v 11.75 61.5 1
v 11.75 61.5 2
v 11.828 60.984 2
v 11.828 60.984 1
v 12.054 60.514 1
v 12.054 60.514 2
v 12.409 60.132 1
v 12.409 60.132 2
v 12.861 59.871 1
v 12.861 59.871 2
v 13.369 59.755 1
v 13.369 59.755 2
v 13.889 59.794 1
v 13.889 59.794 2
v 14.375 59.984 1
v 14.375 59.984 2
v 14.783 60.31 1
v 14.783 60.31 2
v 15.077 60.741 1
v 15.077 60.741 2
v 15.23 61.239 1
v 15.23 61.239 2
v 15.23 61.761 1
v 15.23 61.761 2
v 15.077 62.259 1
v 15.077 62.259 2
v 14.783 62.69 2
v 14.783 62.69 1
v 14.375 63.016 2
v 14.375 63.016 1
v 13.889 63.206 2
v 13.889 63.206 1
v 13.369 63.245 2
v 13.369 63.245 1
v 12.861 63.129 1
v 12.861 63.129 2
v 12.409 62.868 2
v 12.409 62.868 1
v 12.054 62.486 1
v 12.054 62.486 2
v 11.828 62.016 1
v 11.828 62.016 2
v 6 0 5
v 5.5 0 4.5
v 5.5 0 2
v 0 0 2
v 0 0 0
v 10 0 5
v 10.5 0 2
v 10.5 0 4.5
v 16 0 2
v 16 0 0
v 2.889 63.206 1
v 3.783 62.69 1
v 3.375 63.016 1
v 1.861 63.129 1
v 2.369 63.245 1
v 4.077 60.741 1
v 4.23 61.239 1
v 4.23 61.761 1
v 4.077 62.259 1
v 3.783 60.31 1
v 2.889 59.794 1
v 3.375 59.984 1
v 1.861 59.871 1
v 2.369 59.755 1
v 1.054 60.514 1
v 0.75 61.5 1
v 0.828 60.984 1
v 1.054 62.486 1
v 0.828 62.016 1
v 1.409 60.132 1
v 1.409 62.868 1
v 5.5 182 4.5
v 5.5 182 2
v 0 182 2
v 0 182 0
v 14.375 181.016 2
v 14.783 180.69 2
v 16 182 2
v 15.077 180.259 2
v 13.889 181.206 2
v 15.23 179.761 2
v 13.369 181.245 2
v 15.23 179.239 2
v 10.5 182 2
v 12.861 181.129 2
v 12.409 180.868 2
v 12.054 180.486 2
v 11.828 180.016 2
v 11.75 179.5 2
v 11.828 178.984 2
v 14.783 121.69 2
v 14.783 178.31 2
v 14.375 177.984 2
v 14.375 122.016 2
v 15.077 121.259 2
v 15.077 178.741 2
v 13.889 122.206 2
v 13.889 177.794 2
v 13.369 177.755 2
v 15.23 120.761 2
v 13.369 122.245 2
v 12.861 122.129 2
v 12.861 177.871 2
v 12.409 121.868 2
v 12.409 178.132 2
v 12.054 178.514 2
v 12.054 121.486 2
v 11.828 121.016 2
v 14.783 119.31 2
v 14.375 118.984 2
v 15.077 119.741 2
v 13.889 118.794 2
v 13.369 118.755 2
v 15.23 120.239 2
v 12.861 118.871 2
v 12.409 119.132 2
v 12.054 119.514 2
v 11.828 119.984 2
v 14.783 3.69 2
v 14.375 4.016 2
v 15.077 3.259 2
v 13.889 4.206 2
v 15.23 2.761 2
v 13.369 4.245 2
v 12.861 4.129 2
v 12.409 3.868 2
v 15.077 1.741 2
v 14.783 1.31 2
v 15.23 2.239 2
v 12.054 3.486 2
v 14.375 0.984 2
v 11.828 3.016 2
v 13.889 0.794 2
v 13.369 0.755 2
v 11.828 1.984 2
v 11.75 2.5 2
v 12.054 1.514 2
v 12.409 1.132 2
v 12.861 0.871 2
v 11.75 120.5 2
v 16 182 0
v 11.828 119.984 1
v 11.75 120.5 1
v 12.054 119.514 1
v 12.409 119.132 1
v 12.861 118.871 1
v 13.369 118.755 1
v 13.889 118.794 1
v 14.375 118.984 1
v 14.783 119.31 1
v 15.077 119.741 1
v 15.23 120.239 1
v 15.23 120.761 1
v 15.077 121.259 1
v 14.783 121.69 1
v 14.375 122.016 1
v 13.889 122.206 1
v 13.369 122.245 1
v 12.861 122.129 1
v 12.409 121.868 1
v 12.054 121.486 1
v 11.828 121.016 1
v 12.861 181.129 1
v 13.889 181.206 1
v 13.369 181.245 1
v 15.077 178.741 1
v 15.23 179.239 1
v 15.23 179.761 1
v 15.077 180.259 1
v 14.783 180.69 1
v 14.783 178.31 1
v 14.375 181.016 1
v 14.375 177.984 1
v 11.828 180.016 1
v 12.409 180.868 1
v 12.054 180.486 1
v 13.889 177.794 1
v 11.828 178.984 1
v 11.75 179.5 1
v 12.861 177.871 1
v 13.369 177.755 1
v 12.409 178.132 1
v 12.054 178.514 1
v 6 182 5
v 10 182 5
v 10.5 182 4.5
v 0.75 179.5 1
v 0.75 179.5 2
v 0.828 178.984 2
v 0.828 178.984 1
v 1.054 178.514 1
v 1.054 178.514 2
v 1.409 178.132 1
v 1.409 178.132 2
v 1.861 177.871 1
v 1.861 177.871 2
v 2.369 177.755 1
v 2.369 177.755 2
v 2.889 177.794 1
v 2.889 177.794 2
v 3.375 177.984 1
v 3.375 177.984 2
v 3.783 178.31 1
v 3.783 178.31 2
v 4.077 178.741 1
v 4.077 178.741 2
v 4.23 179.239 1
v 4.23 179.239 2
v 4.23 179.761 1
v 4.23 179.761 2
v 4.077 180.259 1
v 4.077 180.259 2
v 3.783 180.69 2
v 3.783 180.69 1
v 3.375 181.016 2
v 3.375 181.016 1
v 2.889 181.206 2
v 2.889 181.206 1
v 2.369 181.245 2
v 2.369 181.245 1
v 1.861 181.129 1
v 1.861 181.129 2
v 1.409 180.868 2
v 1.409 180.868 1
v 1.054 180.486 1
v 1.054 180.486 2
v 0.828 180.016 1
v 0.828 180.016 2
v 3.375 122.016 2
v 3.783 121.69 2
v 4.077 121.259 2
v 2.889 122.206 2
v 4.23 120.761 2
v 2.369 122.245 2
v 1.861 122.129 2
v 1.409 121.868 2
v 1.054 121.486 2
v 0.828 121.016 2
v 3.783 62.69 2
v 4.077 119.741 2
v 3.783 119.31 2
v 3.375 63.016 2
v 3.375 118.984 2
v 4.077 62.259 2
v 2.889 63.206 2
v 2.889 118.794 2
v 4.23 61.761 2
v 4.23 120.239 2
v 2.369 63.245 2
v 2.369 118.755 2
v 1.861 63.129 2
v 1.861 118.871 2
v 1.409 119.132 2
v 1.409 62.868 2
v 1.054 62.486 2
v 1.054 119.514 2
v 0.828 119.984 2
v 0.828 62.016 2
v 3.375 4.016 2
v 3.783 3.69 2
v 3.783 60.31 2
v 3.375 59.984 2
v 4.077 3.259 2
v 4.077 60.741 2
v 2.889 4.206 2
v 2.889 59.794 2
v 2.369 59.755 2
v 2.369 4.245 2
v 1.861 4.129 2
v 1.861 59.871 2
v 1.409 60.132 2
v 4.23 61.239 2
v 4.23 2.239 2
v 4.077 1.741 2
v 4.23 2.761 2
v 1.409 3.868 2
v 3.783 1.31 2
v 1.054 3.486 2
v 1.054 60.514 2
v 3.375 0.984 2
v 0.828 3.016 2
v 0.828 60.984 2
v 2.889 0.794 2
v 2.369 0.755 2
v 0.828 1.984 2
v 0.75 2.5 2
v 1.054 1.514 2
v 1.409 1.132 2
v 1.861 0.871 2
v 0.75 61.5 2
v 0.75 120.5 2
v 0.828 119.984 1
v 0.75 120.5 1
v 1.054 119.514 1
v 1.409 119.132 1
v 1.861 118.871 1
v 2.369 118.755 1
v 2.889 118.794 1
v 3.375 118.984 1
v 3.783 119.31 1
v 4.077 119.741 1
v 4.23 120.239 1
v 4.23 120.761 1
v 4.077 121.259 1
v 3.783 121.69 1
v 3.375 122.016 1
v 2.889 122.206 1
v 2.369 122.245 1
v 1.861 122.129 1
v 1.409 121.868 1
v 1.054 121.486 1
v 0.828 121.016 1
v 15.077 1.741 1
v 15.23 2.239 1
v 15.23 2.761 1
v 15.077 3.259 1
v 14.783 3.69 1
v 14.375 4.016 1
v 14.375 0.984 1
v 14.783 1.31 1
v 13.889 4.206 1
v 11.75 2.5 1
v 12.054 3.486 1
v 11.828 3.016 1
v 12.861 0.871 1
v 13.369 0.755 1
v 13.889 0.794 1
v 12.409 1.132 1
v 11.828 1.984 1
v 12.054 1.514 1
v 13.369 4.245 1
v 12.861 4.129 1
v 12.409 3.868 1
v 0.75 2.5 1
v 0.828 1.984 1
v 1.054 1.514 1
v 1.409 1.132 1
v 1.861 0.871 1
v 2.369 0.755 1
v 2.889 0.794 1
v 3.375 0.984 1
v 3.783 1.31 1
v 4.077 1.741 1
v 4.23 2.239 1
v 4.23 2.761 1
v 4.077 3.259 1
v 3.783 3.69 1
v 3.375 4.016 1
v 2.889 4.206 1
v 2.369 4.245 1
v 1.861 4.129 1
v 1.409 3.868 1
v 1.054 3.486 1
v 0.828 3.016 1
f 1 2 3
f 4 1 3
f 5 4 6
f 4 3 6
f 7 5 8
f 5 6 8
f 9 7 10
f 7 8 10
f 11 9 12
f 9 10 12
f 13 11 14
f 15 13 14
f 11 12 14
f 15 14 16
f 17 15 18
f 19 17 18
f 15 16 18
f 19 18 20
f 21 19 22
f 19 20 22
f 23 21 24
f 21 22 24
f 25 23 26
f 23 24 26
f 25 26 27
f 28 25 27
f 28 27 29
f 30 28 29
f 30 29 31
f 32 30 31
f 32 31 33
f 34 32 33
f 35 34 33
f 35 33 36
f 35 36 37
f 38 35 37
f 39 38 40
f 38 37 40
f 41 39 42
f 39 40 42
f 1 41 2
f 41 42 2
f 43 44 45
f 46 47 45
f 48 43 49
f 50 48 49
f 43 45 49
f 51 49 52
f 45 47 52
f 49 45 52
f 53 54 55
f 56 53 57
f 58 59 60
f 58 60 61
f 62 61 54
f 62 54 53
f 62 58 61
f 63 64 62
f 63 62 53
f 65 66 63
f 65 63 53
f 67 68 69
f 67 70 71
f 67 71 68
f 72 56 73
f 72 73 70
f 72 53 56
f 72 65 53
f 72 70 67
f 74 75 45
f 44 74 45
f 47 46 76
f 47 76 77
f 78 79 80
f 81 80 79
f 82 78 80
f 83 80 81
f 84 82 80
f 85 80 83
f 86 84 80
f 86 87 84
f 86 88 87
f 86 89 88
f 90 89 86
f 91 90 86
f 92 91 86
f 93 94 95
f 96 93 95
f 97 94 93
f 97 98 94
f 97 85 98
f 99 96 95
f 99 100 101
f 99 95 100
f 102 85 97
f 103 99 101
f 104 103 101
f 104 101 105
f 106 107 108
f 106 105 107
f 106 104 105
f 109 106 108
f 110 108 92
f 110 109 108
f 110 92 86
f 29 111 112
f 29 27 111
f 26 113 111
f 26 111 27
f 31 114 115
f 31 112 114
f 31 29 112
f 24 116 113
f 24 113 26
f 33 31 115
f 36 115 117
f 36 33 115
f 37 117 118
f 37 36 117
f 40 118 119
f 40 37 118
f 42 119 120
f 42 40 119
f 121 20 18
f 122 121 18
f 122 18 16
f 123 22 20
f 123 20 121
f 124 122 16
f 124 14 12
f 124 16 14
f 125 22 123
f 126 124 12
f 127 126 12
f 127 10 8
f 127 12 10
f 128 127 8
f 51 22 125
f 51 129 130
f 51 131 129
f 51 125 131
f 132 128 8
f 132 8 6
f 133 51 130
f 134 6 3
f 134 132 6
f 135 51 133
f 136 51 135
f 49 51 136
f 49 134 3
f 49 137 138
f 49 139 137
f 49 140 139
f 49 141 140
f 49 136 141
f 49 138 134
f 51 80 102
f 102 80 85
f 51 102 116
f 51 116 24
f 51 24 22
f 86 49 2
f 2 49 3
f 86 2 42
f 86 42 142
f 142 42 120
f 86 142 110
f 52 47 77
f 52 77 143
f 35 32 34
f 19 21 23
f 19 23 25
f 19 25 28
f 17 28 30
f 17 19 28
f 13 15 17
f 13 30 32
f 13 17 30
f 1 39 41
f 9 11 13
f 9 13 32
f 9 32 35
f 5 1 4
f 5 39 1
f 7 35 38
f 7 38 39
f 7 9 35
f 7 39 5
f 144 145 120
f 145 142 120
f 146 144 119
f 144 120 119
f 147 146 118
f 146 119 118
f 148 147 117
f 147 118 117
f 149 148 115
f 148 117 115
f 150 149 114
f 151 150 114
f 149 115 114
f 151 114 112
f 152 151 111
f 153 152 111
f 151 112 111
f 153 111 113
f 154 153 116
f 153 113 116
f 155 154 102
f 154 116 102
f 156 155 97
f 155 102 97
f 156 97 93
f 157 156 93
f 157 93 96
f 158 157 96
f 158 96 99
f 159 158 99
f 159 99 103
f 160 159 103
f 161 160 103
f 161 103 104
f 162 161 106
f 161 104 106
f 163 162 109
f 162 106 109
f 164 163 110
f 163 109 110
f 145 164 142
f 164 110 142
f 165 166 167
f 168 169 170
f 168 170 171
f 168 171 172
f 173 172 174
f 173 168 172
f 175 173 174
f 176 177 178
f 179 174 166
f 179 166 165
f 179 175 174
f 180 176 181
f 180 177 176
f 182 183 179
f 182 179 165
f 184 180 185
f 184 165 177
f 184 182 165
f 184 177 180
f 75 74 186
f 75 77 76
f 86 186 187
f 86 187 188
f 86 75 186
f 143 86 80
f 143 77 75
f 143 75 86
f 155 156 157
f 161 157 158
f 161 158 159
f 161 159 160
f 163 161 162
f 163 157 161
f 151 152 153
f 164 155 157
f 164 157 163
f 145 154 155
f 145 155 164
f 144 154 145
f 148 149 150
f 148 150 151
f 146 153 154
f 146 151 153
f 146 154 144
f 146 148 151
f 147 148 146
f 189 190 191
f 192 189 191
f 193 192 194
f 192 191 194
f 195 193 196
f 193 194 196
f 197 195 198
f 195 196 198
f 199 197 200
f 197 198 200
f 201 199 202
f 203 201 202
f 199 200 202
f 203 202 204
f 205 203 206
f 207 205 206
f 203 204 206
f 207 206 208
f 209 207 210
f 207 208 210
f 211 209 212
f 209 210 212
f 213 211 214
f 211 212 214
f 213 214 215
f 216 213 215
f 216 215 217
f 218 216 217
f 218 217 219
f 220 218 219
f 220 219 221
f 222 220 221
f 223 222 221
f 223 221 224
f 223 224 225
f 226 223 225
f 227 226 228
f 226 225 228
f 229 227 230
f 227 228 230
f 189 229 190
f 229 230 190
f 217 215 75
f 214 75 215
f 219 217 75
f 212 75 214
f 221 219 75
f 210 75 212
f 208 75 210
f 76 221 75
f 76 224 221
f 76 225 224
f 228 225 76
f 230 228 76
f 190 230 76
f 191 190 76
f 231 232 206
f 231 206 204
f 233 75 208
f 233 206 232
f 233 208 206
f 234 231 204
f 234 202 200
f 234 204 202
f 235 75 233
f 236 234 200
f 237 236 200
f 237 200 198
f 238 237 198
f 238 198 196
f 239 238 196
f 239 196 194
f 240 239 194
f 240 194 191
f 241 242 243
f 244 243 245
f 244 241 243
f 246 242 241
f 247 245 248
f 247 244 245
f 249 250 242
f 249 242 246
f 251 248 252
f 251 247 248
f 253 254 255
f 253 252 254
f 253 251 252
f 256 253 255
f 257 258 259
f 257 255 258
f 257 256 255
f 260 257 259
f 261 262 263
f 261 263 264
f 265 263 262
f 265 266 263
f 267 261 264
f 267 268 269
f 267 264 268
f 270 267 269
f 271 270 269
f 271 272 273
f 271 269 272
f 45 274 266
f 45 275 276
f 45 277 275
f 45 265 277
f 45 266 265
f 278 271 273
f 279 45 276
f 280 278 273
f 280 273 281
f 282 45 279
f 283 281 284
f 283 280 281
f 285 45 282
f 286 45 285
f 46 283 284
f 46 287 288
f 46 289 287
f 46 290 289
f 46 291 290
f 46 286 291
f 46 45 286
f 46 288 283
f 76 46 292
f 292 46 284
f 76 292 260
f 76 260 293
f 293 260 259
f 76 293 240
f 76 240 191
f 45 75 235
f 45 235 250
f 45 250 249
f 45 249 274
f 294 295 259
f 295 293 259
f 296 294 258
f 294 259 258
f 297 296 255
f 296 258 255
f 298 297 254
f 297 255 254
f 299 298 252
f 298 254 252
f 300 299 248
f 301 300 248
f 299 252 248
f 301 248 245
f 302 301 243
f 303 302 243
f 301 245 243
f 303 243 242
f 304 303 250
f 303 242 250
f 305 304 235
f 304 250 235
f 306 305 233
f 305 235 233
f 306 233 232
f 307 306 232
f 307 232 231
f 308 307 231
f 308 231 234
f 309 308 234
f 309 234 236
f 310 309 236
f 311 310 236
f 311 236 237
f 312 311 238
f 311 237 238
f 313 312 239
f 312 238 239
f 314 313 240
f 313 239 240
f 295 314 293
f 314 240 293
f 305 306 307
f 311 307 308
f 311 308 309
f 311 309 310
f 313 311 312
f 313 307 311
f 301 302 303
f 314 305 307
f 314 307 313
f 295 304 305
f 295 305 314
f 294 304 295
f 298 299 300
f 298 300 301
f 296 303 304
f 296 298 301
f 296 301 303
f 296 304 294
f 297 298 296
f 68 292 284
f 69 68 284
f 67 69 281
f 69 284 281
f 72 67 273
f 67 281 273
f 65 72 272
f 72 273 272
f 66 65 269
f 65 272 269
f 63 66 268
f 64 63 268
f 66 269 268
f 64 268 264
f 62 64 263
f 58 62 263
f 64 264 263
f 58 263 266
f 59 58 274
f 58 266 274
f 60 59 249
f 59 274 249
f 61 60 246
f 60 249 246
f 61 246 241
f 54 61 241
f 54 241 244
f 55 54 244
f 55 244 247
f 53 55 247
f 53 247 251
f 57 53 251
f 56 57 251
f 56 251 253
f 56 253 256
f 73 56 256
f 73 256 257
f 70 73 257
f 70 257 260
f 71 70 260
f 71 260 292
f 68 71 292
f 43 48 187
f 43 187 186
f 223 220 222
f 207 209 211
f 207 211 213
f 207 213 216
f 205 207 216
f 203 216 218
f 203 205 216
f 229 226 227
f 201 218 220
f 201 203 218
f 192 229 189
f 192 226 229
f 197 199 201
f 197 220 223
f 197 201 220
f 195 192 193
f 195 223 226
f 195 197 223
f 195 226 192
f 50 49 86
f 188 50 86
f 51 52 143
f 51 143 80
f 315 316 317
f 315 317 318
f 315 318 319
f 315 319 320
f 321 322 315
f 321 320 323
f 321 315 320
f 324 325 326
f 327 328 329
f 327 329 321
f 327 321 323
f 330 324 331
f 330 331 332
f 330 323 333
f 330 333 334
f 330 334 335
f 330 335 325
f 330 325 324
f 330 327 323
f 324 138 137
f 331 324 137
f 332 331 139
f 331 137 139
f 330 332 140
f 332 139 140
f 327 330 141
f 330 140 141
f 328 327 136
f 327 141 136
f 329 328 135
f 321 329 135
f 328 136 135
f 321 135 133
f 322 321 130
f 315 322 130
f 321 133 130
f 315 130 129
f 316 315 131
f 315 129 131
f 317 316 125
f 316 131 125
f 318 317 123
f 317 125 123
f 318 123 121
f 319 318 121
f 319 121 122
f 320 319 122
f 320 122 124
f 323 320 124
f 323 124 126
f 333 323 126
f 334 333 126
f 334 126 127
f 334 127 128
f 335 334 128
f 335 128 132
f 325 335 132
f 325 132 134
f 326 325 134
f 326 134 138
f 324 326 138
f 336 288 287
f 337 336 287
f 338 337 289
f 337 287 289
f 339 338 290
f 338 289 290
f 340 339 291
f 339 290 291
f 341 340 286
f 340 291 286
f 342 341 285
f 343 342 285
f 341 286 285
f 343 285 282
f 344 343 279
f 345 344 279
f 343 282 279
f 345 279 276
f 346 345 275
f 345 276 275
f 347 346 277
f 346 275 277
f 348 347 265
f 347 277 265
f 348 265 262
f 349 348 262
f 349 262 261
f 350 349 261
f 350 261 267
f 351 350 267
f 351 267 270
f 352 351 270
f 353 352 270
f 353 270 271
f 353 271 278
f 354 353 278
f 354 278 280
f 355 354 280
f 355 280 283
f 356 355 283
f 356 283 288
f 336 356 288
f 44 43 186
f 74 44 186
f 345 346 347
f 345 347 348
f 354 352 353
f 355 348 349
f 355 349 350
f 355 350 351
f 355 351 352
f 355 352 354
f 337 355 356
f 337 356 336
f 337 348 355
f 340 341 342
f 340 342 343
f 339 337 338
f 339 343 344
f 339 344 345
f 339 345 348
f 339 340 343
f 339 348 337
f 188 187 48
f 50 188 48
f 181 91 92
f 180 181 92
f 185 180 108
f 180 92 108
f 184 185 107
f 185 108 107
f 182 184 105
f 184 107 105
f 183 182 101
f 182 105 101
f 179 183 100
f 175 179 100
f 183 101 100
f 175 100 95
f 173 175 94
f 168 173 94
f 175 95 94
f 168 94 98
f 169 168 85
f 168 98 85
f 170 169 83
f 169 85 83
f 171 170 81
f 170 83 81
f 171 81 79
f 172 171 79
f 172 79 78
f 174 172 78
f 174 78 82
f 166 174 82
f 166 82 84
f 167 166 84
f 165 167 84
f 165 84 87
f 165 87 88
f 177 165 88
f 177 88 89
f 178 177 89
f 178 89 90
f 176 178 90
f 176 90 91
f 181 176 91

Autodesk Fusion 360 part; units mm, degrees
sketch "3D-printed conduit top outline" plane through (0, 0, 0) normal (0, 1, 0) x (1, 0, 0)
  line L0 (0, 0) -> (16, 0)
  line L1 (16, 0) -> (16, -2)
  line L2 (16, -2) -> (0, -2)
  line L3 (0, -2) -> (0, 0)
  dimension "d7" = 16
  dimension "d8" = 2
extrude "Extrude1" add sketch "3D-printed conduit top outline" along normal blind 182
sketch "Magnet holes" plane through (0, 0, 2) normal (0, 0, 1) x (-1, 0, 0)
  line L0 (0, 0) -> (-16, 0)
  line L1 (-16, 0) -> (-16, -182)
  line L2 (-16, -182) -> (0, -182)
  line L3 (0, -182) -> (0, 0)
  circle A0 centre (-2.5, -2.5) radius 2.5
  circle A1 centre (-13.5, -2.5) radius 2.5
  circle A2 centre (-2.5, -2.5) radius 1.75
  circle A3 centre (-13.5, -2.5) radius 1.75
  circle A4 centre (-2.5, -61.5) radius 1.75
  circle A5 centre (-2.5, -61.5) radius 2.5
  circle A6 centre (-13.5, -61.5) radius 2.5
  circle A7 centre (-13.5, -61.5) radius 1.75
  circle A8 centre (-2.5, -120.5) radius 1.75
  circle A9 centre (-2.5, -120.5) radius 2.5
  circle A10 centre (-13.5, -120.5) radius 2.5
  circle A11 centre (-13.5, -120.5) radius 1.75
  circle A12 centre (-2.5, -179.5) radius 1.75
  circle A13 centre (-2.5, -179.5) radius 2.5
  circle A14 centre (-13.5, -179.5) radius 2.5
  circle A15 centre (-13.5, -179.5) radius 1.75
  dimension "d11" = 5
  dimension "d12" = 5
  dimension "d13" = 3.5
  dimension "d14" = 3.5
  dimension "d17" = 0
  dimension "d18" = -177
extrude "Extrude2" cut sketch "Magnet holes" against normal blind 1 contours A2 | A3 | A4 | A7 | A8 | A11 | A12 | A15
sketch "Support rib" plane through (0, 0, 2) normal (0, 0, 1) x (-1, 0, 0)
  line L0 (0, 0) -> (-16, 0)
  line L1 (-16, 0) -> (-16, -182)
  line L2 (-16, -182) -> (0, -182)
  line L3 (0, -182) -> (0, 0)
  circle A0 centre (-13.5, -179.5) radius 1.75
  circle A1 centre (-13.5, -61.5) radius 1.75
  circle A2 centre (-2.5, -2.5) radius 1.75
  circle A3 centre (-2.5, -120.5) radius 1.75
  circle A4 centre (-2.5, -179.5) radius 1.75
  circle A5 centre (-2.5, -61.5) radius 1.75
  circle A6 centre (-13.5, -2.5) radius 1.75
  circle A7 centre (-13.5, -120.5) radius 1.75
  line L4 (-5.5, 0) -> (-10.5, 0)
  line L5 (-10.5, 0) -> (-10.5, -182)
  line L6 (-10.5, -182) -> (-5.5, -182)
  line L7 (-5.5, -182) -> (-5.5, 0)
  dimension "d23" = 5
  dimension "d24" = 5.5
  dimension "d25" = 5.5
extrude "Extrude3" add sketch "Support rib" along normal blind 3 contours L0 L2 L4 L5 L6 L7
chamfer "Chamfer1" distance 0.5 angle 45 2 edges at (5.5, 91, 5) (10.5, 91, 5)
equation "conduit_length = 182.00 mm"
equation "conduit_width = 16 mm"
equation "conduit_wall_thickness = 2 mm"
equation "magnet_diameter = 3 mm"
equation "magnet_height = 1 mm"
equation "number_of_magnets_on_a_side = 4"
equation "d7 = conduit_width"
equation "d8 = conduit_wall_thickness"
equation "d9 = conduit_length"
equation "d11 = magnet_diameter + 2 mm"
equation "d12 = magnet_diameter + 2 mm"
equation "d13 = magnet_diameter + 0.5 mm"
equation "d14 = magnet_diameter + 0.5 mm"
equation "d16 = number_of_magnets_on_a_side"
equation "d18 = -conduit_length + magnet_diameter + 2 mm"
equation "d19 = -magnet_height"
equation "rib_width = 5 mm"
equation "rib_height = 3 mm"
equation "d23 = rib_width"
equation "d24 = ( conduit_width - rib_width ) / 2"
equation "d26 = rib_height"
equation "rib_chamfer = 0.5 mm"
equation "d29 = rib_chamfer"
